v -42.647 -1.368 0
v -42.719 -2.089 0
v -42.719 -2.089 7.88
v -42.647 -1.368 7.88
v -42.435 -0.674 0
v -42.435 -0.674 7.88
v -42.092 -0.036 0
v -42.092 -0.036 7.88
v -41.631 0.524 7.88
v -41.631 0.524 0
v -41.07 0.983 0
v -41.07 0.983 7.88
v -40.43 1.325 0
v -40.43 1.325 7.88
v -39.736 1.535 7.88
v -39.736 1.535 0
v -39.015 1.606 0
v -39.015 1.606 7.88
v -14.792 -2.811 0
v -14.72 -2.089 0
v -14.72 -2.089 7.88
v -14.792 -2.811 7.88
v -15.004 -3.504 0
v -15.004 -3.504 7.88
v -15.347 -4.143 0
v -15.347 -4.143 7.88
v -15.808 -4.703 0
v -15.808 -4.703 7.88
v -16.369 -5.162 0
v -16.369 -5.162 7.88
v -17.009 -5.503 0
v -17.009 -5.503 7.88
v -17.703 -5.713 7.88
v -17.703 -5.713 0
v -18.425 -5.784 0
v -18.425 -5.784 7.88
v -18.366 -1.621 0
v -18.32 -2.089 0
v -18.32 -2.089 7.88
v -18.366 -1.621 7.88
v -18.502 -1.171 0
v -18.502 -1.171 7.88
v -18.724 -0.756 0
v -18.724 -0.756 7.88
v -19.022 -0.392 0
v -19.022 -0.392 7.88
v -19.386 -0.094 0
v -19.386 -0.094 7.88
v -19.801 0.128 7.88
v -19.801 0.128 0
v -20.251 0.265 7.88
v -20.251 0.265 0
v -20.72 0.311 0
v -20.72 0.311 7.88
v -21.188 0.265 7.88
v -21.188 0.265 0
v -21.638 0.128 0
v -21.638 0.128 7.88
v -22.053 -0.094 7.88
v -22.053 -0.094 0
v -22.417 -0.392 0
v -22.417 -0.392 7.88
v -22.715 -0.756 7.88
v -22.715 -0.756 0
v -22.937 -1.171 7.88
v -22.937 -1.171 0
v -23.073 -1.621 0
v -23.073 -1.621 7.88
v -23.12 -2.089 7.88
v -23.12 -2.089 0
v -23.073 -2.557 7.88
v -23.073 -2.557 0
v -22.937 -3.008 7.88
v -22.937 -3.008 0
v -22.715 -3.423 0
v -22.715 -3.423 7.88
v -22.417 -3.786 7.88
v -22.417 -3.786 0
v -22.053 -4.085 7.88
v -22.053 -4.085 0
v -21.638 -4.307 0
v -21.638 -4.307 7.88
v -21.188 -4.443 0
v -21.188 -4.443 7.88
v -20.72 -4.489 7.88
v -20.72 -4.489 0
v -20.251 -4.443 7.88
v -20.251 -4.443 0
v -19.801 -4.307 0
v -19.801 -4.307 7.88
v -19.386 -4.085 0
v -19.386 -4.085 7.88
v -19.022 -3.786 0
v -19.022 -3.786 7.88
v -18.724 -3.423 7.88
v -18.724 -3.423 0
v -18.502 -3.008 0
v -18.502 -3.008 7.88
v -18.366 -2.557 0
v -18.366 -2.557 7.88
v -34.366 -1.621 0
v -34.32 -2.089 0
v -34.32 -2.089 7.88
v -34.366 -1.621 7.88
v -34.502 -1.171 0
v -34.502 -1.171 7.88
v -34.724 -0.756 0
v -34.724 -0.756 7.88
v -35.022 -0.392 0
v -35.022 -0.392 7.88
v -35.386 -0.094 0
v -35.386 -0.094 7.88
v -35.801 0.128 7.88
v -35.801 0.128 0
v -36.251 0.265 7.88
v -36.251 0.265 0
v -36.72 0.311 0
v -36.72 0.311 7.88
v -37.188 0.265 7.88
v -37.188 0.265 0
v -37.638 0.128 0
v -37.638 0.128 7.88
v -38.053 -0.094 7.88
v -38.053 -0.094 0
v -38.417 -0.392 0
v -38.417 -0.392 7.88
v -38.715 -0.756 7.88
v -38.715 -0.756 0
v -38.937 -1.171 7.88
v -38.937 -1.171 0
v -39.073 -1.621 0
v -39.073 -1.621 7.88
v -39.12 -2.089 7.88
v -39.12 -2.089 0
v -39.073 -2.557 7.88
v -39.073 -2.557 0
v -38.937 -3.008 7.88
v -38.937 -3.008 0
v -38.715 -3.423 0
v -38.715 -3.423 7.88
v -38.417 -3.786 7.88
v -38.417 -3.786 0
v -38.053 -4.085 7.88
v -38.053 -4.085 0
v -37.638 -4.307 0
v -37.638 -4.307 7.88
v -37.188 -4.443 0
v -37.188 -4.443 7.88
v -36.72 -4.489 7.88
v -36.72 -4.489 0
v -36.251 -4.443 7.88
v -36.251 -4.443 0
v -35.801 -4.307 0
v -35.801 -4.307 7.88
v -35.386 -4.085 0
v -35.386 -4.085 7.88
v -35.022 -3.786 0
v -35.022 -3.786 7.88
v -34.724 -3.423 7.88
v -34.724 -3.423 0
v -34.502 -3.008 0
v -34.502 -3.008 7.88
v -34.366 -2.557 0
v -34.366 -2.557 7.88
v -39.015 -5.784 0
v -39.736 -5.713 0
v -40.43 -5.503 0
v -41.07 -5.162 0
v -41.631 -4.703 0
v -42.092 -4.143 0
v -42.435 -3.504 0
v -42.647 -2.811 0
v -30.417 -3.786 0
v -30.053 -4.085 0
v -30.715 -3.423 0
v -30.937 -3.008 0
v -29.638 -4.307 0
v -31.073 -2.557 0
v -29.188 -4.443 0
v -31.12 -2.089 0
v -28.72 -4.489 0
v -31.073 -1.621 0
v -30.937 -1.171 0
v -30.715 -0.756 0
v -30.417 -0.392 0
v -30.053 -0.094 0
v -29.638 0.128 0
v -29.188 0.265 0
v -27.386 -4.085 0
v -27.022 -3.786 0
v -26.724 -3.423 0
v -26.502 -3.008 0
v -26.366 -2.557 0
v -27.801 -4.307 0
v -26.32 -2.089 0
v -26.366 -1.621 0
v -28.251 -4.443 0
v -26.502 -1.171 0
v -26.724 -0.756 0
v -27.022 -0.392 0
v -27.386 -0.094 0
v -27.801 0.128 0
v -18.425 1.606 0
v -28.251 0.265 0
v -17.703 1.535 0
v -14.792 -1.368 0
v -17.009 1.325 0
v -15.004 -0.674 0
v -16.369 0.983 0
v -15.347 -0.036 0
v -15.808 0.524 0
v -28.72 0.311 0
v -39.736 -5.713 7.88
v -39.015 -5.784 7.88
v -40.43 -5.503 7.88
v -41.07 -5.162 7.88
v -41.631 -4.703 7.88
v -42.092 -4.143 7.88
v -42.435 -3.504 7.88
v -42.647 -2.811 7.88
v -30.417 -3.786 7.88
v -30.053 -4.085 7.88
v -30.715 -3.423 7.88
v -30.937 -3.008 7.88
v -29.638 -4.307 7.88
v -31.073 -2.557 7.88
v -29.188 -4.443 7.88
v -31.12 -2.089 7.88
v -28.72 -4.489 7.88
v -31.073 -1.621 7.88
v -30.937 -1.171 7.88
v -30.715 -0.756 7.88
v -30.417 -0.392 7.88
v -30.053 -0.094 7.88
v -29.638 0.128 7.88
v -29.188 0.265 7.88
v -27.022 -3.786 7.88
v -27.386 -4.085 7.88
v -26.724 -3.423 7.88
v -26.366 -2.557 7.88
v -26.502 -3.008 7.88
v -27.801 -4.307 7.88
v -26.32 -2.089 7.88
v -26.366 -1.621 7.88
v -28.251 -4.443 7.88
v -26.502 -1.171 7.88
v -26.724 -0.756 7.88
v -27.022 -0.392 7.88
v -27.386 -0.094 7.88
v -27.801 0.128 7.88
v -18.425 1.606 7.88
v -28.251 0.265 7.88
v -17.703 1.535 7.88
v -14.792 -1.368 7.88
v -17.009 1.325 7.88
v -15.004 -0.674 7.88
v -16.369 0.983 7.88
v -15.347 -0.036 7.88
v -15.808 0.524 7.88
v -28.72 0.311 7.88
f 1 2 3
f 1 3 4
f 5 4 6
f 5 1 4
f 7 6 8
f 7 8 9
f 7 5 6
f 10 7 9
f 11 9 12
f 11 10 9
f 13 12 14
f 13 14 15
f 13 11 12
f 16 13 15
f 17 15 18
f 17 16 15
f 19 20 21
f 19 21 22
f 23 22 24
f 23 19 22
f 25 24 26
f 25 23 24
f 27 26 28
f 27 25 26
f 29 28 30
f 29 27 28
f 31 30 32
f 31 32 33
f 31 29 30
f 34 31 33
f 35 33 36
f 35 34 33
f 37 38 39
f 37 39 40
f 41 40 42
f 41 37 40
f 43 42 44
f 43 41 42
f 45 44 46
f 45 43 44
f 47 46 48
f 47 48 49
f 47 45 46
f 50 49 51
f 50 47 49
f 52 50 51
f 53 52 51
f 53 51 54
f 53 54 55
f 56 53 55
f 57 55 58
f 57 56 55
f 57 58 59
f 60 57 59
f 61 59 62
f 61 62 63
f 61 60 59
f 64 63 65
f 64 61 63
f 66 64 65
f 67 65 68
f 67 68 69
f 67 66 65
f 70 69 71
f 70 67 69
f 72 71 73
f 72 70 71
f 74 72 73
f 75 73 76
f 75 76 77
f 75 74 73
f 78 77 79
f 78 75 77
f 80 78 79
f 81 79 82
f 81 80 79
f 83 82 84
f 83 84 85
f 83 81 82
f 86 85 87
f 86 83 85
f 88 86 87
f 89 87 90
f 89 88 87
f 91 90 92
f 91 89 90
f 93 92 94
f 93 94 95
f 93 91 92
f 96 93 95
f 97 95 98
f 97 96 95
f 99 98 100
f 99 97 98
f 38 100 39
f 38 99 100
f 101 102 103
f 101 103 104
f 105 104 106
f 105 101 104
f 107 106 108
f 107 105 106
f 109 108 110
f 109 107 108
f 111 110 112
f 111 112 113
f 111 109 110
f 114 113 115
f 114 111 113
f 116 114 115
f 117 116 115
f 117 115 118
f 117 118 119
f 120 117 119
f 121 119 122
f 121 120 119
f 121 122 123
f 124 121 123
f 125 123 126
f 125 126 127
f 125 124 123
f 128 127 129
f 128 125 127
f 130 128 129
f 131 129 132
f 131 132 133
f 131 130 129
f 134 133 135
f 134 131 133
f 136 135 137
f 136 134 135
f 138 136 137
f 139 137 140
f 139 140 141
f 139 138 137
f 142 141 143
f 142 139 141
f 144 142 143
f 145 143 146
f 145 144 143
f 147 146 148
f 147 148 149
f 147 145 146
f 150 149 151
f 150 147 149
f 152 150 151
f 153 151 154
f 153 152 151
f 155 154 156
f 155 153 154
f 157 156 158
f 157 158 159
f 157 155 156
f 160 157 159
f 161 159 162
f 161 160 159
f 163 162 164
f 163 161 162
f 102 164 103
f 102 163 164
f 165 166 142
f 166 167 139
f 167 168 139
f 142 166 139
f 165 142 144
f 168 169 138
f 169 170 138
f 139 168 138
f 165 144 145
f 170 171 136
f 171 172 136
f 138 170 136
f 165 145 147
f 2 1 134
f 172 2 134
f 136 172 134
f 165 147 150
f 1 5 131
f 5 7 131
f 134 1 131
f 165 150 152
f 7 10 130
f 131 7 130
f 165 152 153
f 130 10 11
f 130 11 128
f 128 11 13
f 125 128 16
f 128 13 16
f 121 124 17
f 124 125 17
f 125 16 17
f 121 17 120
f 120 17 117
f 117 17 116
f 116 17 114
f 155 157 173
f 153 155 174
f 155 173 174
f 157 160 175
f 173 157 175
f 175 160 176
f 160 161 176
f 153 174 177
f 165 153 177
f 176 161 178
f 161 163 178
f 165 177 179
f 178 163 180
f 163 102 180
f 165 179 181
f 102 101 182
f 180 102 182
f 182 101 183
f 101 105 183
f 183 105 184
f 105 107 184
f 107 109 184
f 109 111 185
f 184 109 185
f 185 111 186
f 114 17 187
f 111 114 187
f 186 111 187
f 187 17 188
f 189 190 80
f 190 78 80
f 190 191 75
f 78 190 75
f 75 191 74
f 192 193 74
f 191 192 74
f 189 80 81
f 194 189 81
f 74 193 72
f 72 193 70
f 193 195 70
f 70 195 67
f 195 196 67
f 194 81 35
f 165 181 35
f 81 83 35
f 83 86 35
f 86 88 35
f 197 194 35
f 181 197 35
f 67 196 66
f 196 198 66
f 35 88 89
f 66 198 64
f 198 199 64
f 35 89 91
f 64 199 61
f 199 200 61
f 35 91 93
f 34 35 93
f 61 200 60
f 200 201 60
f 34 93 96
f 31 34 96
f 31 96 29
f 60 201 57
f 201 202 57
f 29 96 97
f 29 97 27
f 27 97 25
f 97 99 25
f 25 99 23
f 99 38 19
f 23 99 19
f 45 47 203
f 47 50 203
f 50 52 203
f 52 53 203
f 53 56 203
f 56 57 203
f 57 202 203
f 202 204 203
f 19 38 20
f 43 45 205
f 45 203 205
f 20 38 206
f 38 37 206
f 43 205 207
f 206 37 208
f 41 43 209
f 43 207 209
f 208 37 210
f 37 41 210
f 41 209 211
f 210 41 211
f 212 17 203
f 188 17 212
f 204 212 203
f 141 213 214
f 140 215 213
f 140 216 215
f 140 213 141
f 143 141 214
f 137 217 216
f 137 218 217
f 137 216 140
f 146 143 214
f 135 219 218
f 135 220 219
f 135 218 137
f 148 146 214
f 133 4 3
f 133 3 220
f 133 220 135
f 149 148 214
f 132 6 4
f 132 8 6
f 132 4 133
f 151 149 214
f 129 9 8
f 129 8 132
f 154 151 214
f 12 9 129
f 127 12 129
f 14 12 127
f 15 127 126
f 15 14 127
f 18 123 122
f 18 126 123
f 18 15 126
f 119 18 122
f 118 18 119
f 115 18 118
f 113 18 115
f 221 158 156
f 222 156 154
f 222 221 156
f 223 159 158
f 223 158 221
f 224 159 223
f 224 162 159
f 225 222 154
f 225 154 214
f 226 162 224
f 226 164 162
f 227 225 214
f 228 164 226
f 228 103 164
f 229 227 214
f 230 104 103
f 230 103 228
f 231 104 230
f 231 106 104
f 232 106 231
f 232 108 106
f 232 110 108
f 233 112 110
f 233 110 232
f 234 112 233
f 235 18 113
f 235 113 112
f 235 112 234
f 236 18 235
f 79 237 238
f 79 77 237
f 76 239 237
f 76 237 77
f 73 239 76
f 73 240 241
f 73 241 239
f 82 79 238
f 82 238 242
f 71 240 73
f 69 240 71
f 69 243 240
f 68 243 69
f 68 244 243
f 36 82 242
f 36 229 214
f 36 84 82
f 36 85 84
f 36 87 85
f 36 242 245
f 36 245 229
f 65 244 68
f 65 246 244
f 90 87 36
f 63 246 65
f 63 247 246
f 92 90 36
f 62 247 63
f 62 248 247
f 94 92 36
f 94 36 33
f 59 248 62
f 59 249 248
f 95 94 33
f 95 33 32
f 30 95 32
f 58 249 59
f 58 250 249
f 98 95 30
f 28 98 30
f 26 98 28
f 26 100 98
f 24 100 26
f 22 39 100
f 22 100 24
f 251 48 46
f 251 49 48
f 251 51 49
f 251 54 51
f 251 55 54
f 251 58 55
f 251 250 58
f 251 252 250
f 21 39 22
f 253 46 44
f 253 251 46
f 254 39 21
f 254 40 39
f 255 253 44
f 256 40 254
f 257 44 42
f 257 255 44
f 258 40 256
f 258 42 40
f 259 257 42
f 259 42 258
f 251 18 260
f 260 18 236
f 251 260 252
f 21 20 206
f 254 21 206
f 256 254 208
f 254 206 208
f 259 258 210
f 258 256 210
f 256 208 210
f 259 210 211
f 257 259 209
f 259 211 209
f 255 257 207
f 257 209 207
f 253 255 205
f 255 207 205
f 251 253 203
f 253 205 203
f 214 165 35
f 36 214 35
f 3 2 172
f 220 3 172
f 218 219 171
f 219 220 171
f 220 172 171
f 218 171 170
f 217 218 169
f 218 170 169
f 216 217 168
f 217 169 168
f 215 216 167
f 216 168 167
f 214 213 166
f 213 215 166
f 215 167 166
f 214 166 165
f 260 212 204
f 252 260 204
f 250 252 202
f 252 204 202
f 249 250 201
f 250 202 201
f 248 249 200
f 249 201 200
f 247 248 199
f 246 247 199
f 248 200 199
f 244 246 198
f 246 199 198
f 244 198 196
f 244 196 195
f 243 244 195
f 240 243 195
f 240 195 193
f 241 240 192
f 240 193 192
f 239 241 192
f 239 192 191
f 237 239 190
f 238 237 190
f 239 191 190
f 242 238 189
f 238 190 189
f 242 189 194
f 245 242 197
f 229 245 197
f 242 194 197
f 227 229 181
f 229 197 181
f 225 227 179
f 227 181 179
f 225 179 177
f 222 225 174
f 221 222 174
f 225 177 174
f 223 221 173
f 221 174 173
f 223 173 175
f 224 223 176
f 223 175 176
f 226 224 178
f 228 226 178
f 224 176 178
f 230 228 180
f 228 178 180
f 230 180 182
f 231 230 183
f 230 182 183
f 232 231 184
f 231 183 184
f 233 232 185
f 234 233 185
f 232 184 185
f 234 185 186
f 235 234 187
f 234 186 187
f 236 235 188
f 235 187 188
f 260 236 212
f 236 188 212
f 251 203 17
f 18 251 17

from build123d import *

# Parameters (mm, degrees)
F0_R        = 2.4
F1_DEPTH    = 7.88
F2_T1_DEPTH = 26.405


# Not quite as in the source:
# - a fillet or chamfer that OpenCascade refuses, or shapes differently, is made with other operations: its cross-section is extruded or revolved along the edge and cut away or added


with BuildPart() as f1:
    # F0 (on Top) → F1 (new body)
    with BuildSketch(Plane.XY):
        Polygon((-14.7195083171, 1.6058013724), (-28.7195083171, 1.6058013724), (-42.7195083171, 1.6058013724), (-42.7195083171, -2.0891986276), (-42.7195083171, -5.7841986276), (-28.7195083171, -5.7841986276), (-14.7195083171, -5.7841986276), (-14.7195083171, -2.0891986276), align=None)
        with Locations((-36.7195083171, -2.0891986276)):
            Circle(F0_R, mode=Mode.SUBTRACT)
        with BuildLine():
            ThreePointArc((-28.7195083171, -4.4891986276), (-31.1195083171, -2.0891986276), (-28.7195083171, 0.3108013724))
            ThreePointArc((-28.7195083171, 0.3108013724), (-26.3195083171, -2.0891986276), (-28.7195083171, -4.4891986276))
        make_face(mode=Mode.SUBTRACT)
        with Locations((-20.7195083171, -2.0891986276)):
            Circle(F0_R, mode=Mode.SUBTRACT)
    extrude(amount=F1_DEPTH)

    # F2: fillet of radius 3.705 on 4 edges, made by hand

    # F2_s2 → F2_t1 (cut)
    with BuildSketch(Plane.XY.offset(-9.2625)):
        with BuildLine():
            ThreePointArc((-14.7195083171, -2.0991986276), (-15.8046776928, 0.5206319967), (-18.4245083171, 1.6058013724))
            Line((-18.4245083171, 1.6058013724), (-14.7195083171, 1.6058013724))
            Line((-14.7195083171, 1.6058013724), (-14.7195083171, -2.0991986276))
        make_face()
        with BuildLine():
            ThreePointArc((-14.7195083171, -2.0791986276), (-15.8046776928, -4.6990292519), (-18.4245083171, -5.7841986276))
            Line((-18.4245083171, -5.7841986276), (-14.7195083171, -5.7841986276))
            Line((-14.7195083171, -5.7841986276), (-14.7195083171, -2.0791986276))
        make_face()
        with BuildLine():
            ThreePointArc((-42.7195083171, -2.0991986276), (-41.6343389413, 0.5206319967), (-39.0145083171, 1.6058013724))
            Line((-39.0145083171, 1.6058013724), (-42.7195083171, 1.6058013724))
            Line((-42.7195083171, 1.6058013724), (-42.7195083171, -2.0991986276))
        make_face()
        with BuildLine():
            ThreePointArc((-42.7195083171, -2.0791986276), (-41.6343389413, -4.6990292519), (-39.0145083171, -5.7841986276))
            Line((-39.0145083171, -5.7841986276), (-42.7195083171, -5.7841986276))
            Line((-42.7195083171, -5.7841986276), (-42.7195083171, -2.0791986276))
        make_face()
    extrude(amount=F2_T1_DEPTH, mode=Mode.SUBTRACT)


solid = f1.part
